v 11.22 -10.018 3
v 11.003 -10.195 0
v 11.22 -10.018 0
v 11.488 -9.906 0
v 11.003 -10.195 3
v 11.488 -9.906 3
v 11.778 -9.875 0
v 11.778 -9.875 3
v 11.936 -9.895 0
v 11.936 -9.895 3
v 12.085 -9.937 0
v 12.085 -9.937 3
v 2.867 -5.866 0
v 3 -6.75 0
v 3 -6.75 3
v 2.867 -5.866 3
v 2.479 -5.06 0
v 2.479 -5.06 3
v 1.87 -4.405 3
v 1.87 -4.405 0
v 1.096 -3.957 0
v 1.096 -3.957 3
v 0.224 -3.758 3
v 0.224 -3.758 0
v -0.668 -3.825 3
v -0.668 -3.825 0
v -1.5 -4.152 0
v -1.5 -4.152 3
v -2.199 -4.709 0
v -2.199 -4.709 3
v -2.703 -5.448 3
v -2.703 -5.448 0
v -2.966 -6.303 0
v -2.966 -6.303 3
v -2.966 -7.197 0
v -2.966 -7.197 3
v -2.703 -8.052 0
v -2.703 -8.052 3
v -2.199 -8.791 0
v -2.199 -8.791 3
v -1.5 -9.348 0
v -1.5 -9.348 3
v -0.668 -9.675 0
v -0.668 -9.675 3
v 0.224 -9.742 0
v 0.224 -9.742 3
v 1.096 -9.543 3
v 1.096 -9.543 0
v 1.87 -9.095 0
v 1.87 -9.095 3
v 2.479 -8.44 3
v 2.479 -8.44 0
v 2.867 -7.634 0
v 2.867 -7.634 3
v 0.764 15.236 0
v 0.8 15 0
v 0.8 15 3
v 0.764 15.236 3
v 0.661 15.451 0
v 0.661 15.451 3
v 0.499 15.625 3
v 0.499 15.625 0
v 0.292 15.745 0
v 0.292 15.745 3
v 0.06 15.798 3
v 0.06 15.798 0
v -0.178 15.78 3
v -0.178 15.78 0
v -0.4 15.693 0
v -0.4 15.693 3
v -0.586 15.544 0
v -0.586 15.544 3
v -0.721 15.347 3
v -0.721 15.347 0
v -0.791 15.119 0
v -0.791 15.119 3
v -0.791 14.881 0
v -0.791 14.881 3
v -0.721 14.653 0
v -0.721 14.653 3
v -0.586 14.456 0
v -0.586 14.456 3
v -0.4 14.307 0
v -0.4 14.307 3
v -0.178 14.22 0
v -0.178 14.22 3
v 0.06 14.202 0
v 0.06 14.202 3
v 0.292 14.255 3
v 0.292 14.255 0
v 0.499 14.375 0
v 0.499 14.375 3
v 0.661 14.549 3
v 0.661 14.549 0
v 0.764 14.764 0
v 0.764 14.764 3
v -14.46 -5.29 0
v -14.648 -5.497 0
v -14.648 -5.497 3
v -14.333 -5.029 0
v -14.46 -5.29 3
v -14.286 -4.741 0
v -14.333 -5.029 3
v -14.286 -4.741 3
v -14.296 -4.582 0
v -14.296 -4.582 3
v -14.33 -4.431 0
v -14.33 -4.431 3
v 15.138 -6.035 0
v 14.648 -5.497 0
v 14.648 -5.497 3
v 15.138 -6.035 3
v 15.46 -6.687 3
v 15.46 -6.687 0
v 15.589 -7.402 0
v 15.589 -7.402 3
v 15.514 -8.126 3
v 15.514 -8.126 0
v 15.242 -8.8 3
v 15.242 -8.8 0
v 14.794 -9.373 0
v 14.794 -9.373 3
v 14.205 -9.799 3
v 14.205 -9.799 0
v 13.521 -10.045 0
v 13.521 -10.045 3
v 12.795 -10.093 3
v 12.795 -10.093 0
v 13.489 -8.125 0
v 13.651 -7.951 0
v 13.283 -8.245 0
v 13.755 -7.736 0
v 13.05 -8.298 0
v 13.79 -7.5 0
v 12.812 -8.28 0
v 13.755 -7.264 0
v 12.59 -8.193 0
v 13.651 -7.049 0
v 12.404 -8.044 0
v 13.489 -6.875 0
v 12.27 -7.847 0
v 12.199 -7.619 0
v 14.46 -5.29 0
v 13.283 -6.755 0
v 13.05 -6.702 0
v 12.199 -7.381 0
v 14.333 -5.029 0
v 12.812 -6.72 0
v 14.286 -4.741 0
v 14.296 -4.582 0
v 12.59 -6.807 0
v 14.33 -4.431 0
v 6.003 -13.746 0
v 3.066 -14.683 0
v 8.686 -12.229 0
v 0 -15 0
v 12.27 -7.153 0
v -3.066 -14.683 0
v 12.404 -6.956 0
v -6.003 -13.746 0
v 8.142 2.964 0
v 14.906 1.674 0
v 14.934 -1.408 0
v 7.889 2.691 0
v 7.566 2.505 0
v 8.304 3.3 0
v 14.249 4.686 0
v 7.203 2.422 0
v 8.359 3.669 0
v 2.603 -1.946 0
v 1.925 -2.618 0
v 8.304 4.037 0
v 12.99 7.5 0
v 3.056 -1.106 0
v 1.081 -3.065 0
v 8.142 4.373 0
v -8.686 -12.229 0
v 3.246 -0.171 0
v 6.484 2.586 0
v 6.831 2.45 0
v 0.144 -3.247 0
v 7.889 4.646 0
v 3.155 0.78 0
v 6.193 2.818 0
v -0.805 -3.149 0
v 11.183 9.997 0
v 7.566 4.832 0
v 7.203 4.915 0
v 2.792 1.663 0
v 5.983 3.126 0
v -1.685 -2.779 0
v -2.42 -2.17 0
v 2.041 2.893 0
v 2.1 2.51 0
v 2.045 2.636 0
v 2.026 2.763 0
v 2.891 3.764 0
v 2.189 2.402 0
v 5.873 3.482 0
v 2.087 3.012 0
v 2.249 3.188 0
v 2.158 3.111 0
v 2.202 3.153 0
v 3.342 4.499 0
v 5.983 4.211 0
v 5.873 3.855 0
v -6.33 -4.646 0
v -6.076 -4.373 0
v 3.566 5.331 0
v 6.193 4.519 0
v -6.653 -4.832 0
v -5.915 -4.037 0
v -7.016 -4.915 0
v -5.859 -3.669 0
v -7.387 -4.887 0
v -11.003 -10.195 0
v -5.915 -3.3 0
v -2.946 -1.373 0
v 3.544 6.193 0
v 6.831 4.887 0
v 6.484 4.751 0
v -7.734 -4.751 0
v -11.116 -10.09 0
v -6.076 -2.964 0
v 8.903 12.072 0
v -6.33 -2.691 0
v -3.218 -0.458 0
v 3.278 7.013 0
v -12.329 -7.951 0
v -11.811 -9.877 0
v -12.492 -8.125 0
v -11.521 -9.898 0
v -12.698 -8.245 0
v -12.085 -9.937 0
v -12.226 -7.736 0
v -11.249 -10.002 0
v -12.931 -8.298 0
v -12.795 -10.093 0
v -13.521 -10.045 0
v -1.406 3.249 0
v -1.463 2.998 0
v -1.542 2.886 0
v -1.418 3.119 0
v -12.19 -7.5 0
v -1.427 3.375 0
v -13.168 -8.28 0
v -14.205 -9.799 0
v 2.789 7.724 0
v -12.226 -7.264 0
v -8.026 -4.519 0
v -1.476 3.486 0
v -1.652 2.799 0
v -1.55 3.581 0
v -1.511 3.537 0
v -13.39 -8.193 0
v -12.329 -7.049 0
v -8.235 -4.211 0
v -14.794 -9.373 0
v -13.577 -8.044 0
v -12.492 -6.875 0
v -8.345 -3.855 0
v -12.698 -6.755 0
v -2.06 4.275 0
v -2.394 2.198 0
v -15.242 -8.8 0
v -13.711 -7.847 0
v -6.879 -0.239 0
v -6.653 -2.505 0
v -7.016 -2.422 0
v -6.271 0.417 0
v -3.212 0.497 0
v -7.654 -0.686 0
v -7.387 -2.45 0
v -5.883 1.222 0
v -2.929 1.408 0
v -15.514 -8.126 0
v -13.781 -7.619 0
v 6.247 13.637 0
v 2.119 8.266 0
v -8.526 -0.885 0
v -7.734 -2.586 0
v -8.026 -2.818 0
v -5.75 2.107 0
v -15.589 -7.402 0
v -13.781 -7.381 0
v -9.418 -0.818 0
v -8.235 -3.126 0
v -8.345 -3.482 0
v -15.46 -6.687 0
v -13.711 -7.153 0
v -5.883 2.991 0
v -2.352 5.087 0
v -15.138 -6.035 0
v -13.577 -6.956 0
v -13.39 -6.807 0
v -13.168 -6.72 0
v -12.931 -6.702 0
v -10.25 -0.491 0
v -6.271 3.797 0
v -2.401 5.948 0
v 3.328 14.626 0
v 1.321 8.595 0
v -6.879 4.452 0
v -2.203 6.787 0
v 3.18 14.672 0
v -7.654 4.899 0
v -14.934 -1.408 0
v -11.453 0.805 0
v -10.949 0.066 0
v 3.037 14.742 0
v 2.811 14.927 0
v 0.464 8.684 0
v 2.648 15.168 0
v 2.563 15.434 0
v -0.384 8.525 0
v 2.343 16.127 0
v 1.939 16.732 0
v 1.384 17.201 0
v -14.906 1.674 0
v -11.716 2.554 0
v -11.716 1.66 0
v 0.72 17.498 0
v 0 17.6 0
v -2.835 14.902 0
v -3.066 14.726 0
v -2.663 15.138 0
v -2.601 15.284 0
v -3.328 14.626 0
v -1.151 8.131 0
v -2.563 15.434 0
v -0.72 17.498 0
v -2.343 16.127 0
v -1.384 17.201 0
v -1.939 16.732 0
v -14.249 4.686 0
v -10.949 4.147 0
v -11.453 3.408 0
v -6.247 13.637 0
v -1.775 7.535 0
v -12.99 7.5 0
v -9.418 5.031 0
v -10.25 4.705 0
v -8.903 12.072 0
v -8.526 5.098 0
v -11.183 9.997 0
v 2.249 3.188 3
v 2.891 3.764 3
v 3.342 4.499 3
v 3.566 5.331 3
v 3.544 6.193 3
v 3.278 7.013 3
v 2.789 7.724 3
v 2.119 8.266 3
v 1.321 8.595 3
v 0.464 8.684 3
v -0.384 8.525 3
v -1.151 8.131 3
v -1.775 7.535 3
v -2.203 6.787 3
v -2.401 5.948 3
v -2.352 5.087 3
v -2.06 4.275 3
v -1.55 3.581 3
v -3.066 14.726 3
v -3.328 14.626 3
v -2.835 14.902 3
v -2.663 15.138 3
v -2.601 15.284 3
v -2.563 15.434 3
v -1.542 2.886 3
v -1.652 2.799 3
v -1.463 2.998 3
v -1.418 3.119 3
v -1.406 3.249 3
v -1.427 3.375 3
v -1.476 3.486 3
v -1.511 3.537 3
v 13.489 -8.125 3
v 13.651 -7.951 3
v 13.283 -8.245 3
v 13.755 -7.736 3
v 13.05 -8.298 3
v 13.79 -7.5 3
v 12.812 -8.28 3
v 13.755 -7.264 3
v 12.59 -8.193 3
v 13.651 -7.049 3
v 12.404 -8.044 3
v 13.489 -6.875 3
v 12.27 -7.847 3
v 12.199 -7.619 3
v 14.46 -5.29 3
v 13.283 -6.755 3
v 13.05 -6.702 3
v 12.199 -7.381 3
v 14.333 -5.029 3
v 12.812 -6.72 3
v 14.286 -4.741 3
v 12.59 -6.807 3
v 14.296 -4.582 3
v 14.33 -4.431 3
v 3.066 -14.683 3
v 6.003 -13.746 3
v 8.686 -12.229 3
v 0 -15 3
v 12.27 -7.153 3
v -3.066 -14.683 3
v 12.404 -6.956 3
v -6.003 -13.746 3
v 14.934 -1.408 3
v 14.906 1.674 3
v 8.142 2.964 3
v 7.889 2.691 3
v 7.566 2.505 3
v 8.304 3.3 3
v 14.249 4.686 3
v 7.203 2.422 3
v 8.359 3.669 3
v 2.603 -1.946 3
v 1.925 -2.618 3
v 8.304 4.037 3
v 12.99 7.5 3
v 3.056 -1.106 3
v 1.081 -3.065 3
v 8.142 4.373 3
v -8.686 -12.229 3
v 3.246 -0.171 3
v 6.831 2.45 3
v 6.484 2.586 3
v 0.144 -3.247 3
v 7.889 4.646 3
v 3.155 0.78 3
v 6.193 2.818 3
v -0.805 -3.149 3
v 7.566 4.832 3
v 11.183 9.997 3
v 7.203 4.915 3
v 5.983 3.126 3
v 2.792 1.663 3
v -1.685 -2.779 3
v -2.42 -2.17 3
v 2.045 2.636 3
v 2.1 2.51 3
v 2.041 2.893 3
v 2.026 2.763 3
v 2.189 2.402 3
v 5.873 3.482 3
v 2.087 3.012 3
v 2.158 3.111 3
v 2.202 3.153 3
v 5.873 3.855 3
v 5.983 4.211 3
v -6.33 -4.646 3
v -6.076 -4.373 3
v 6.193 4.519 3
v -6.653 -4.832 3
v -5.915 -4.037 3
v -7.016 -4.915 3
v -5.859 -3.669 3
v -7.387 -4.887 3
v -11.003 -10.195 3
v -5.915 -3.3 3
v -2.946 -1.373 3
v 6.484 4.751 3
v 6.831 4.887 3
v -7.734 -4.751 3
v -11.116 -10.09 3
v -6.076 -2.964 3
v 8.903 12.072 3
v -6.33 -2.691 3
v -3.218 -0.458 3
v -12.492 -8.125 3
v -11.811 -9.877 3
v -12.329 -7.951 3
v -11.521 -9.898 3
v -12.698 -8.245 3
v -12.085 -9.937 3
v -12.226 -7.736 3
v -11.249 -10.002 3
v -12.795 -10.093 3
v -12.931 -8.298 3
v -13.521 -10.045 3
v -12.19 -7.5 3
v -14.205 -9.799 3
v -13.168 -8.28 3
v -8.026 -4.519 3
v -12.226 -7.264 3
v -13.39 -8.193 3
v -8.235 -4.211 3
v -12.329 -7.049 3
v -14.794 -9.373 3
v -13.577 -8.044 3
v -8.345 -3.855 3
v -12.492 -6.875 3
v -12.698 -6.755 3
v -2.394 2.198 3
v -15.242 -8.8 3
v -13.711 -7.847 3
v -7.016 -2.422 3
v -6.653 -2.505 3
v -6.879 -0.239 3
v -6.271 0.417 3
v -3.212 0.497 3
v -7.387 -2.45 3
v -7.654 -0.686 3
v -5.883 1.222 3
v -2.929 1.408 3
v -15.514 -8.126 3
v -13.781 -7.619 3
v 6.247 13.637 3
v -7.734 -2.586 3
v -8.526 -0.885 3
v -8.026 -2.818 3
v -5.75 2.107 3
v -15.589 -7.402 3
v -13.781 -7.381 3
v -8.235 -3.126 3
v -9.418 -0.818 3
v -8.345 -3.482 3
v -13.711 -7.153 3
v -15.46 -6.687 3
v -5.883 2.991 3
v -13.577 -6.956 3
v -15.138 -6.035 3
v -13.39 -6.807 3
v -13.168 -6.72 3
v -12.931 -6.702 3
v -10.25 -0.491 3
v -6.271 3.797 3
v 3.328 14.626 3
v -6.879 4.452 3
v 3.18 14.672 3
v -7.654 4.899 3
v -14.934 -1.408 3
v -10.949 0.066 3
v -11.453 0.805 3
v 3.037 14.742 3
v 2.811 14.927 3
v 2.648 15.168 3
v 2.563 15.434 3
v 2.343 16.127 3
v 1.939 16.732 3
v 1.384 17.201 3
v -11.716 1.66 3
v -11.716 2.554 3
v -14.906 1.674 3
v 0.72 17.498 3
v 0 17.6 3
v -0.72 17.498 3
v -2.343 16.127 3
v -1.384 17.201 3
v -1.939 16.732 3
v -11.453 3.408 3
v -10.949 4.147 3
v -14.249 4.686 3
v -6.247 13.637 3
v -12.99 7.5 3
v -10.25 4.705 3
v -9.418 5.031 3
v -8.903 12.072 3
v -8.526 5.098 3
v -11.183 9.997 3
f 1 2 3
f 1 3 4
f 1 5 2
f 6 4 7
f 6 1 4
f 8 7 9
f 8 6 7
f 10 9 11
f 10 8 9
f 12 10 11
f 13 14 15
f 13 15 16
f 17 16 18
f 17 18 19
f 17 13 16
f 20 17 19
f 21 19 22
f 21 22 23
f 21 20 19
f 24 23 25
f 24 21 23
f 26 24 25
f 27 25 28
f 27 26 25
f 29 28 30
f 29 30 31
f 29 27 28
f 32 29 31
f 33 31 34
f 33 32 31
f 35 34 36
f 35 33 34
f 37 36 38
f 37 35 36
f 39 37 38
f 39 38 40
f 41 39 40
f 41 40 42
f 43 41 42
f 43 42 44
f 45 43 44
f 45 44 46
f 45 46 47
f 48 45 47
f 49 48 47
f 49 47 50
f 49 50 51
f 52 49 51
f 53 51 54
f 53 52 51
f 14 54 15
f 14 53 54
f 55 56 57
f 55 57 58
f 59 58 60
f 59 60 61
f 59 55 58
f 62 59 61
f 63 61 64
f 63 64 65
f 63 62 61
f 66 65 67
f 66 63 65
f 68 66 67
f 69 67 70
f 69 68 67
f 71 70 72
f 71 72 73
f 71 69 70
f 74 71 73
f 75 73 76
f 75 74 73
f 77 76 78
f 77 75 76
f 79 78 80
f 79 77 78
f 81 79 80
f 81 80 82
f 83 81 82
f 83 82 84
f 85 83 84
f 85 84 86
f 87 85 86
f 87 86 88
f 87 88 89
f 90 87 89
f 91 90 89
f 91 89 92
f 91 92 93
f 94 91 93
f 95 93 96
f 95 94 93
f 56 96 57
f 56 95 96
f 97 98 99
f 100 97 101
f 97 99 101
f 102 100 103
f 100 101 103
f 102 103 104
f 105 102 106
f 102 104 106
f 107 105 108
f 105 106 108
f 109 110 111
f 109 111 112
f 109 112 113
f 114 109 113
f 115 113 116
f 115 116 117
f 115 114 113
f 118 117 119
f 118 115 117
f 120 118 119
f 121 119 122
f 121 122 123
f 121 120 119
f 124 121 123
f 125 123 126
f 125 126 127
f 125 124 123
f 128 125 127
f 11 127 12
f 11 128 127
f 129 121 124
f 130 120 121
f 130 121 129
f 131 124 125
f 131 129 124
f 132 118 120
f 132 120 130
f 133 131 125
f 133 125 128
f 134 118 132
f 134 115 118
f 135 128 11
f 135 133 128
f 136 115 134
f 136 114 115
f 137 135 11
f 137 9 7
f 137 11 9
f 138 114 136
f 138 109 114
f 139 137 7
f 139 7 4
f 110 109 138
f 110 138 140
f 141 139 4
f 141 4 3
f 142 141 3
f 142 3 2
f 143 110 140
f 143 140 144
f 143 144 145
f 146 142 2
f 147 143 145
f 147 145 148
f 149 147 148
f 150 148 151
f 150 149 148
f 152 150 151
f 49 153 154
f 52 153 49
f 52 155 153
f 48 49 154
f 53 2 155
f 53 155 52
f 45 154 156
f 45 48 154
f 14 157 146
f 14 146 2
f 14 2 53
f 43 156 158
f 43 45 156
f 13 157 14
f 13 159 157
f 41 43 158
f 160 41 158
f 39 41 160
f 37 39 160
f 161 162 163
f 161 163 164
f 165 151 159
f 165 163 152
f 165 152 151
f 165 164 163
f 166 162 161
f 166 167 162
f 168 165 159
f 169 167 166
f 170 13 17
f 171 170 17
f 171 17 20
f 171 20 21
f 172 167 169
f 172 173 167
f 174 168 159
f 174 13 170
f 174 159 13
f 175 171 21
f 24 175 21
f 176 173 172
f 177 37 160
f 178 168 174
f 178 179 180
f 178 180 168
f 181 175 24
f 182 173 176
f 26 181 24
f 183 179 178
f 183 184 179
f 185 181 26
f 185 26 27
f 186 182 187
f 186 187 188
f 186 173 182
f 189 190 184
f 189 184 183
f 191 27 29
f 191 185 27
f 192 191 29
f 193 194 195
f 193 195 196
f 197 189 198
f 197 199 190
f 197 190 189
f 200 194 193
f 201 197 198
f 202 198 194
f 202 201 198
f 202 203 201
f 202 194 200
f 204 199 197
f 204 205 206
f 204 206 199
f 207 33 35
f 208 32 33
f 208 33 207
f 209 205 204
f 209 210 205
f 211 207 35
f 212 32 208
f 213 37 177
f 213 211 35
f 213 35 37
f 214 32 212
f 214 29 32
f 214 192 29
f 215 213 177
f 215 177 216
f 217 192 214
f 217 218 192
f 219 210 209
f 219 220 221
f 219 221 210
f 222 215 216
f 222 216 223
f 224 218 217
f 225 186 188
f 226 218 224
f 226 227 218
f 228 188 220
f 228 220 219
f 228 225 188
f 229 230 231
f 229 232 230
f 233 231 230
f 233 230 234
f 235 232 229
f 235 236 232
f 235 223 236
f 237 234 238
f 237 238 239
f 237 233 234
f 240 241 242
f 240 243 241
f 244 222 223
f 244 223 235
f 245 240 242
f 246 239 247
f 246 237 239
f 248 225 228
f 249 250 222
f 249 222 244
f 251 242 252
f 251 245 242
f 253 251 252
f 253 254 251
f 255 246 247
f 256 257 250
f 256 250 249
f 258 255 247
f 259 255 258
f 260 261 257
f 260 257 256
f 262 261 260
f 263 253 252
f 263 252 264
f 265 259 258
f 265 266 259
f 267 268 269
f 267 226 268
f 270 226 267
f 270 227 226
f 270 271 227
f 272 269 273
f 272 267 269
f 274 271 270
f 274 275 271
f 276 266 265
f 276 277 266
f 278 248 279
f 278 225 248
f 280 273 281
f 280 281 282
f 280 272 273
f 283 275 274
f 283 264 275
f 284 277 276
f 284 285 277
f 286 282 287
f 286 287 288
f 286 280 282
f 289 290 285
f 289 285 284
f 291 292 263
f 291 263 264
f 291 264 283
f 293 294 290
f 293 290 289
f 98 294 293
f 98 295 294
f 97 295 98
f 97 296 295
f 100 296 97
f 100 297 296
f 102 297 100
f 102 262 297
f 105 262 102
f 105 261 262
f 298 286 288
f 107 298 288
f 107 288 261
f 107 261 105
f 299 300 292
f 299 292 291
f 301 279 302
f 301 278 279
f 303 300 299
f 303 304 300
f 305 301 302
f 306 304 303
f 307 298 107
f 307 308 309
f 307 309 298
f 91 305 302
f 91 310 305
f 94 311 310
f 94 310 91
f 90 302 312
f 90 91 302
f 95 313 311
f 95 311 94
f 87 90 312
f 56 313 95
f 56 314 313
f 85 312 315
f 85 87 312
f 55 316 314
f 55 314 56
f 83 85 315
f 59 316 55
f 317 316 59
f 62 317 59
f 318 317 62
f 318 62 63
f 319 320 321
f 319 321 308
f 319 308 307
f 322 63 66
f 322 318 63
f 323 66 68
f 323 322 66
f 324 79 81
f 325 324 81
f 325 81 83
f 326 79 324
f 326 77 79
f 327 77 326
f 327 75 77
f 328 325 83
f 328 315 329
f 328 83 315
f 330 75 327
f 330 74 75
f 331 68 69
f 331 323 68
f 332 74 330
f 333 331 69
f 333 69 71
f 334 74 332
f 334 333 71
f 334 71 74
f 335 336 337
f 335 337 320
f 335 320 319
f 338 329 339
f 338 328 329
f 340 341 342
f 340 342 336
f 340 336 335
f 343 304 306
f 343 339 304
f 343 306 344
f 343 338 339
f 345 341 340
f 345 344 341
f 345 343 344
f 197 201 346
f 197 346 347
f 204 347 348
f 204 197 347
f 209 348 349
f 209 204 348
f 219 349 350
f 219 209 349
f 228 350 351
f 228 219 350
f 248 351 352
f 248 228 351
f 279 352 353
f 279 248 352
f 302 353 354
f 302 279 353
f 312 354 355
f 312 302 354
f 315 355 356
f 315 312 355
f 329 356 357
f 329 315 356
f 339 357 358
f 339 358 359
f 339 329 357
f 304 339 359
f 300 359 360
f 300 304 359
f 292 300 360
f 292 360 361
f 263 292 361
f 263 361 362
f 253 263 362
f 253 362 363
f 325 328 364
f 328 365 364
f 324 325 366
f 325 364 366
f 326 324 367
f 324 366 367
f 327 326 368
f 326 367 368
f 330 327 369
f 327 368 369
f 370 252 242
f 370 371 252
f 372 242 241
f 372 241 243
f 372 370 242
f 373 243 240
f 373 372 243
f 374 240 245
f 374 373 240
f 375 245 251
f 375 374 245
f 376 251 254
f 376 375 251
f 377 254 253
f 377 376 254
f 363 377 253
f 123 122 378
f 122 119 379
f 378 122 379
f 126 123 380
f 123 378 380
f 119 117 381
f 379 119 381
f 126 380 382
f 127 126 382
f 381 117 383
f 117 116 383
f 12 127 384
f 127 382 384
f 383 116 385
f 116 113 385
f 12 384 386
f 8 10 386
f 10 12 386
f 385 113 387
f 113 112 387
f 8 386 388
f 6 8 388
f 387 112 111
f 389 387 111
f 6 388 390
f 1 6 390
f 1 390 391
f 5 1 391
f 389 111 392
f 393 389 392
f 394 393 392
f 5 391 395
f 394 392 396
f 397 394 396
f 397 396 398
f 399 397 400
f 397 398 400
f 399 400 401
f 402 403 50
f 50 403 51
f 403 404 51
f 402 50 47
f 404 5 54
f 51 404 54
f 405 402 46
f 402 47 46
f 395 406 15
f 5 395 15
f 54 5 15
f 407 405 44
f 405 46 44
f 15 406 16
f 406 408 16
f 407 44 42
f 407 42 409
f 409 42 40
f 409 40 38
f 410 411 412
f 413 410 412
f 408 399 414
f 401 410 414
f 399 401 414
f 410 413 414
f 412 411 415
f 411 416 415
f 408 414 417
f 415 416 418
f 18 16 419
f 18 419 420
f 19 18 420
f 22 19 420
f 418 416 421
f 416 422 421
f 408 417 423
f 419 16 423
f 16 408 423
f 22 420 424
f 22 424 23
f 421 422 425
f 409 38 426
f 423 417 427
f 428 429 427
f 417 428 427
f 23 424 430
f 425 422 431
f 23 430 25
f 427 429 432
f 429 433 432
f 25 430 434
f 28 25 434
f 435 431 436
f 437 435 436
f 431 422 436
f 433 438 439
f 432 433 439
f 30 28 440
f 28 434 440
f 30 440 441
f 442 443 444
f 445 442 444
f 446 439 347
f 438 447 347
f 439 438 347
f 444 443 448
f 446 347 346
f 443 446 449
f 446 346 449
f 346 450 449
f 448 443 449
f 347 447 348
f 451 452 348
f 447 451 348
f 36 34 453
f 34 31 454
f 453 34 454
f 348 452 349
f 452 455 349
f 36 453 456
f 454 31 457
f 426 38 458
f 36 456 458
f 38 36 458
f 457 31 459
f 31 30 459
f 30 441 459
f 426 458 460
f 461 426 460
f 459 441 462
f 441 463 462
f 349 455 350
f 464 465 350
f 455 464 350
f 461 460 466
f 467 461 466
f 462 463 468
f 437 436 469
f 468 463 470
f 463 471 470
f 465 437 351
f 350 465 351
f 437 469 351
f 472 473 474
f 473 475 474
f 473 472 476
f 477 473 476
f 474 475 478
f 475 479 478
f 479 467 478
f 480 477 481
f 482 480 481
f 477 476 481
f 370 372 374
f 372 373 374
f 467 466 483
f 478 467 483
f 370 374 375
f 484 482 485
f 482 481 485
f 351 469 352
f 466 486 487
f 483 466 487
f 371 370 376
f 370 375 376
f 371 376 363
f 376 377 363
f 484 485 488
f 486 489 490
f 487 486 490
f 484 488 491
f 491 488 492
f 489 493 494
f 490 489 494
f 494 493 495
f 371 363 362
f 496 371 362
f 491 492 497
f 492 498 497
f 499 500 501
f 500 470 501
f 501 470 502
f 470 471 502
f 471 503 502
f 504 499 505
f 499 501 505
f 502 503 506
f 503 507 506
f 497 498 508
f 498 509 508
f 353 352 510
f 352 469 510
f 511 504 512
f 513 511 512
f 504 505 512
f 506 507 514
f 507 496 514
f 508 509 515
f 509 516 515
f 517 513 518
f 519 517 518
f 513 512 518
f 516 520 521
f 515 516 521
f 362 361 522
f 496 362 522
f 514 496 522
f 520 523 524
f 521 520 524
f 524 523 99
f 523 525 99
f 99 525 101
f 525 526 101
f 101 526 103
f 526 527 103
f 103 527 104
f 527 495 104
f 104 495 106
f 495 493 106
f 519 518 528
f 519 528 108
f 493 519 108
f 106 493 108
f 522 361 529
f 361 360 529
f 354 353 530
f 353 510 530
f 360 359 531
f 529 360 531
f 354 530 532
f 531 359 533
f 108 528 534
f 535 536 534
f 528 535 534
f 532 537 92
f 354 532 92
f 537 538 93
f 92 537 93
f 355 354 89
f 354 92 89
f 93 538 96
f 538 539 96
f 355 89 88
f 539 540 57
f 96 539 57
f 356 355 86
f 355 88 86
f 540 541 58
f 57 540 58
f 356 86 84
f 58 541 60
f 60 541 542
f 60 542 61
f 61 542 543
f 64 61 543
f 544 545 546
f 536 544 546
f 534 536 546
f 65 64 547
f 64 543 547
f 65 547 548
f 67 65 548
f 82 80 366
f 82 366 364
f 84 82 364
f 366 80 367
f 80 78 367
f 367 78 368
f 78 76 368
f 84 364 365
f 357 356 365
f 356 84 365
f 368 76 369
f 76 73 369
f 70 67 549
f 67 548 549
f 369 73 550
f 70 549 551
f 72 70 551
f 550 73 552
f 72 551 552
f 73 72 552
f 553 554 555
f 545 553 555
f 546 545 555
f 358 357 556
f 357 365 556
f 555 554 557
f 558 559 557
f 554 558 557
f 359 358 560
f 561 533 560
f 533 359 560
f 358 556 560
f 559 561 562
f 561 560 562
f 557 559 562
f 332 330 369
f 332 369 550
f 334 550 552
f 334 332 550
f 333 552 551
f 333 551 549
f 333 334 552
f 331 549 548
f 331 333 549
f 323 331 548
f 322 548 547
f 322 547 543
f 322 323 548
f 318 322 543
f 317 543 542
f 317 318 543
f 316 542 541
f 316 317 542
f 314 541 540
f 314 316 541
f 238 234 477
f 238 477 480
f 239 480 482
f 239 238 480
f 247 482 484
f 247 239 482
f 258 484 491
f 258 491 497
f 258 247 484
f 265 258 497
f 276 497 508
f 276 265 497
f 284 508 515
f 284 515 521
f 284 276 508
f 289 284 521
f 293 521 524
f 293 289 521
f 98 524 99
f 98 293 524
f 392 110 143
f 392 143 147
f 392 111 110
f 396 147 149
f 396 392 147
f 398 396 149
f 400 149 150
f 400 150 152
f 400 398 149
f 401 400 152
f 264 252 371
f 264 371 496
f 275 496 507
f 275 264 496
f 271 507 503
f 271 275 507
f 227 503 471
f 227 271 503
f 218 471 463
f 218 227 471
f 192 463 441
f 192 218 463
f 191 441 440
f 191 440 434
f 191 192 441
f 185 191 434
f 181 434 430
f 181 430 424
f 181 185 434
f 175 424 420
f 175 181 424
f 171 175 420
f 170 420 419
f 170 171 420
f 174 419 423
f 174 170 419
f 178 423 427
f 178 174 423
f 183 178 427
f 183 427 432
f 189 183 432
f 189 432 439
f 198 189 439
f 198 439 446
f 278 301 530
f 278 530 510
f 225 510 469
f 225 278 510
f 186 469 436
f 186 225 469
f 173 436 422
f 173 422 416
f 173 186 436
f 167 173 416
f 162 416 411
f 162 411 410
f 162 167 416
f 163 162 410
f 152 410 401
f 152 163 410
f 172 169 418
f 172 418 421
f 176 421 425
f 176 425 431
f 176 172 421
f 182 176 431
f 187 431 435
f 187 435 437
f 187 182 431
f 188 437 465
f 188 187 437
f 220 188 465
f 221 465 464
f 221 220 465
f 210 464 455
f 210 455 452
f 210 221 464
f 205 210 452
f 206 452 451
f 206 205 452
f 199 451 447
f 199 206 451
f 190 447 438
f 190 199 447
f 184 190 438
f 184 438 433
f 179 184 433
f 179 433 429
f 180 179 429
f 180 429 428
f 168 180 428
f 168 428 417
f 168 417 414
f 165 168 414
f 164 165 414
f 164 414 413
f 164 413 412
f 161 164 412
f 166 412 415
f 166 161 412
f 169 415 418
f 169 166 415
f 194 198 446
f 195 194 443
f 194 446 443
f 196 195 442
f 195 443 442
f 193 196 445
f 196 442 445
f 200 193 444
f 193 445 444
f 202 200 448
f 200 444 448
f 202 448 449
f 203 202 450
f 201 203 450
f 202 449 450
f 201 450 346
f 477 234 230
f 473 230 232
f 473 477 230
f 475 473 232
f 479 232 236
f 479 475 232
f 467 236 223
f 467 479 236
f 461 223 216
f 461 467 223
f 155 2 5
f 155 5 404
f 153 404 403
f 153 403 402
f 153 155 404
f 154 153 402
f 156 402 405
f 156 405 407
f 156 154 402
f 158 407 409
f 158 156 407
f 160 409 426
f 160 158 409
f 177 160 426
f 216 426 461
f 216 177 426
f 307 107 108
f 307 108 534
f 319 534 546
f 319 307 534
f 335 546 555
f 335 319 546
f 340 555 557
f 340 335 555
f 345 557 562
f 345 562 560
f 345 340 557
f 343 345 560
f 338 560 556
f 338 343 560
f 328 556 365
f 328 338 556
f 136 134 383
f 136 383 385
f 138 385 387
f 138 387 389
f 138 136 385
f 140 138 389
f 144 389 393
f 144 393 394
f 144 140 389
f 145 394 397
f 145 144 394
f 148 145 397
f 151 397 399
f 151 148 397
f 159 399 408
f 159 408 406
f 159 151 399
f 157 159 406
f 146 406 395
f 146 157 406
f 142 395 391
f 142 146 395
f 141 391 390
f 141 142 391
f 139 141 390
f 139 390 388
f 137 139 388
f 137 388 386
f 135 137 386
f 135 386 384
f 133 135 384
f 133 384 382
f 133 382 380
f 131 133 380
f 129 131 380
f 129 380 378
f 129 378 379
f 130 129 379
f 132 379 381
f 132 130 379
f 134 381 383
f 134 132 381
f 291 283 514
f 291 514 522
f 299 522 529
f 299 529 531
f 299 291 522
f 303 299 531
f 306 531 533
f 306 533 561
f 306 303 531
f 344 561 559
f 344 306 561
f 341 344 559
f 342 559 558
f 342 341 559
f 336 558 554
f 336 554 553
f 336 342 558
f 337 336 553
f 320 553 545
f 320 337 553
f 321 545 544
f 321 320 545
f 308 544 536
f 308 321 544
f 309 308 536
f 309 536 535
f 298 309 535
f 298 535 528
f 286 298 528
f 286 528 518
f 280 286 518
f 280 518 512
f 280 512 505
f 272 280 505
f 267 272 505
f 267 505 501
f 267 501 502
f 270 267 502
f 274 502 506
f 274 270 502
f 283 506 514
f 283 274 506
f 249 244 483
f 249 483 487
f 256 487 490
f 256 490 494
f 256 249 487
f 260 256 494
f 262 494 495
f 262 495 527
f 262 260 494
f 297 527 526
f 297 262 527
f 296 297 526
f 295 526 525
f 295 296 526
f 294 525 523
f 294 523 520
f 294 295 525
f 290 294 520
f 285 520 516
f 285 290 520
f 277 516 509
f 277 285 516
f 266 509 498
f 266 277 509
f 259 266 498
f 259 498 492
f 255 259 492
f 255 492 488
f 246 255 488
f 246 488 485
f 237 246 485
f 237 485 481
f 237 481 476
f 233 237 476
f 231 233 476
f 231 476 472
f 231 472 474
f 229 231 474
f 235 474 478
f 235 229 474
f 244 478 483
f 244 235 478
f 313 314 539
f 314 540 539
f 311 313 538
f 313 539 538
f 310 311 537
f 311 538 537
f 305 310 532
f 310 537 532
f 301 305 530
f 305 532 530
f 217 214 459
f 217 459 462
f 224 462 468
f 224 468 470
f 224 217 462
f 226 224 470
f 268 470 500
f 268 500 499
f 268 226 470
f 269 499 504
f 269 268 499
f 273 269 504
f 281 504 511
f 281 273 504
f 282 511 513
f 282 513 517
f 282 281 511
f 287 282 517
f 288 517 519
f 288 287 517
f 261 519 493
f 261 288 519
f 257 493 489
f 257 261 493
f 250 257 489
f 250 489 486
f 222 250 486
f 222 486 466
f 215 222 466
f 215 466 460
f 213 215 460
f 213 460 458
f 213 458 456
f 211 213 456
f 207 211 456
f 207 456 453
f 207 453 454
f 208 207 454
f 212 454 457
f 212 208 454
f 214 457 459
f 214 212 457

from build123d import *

# Parameters (mm, degrees)
SKETCH_1_R      = 3
SKETCH_1_R_2    = 0.8
SKETCH_1_R_3    = 1.25
EXTRUDE_1_DEPTH = 3
FILLET_1_R      = 0.5
FILLET_2_R      = 1


with BuildPart() as part:
    # ｽｹｯﾁ1 → ﾎﾞｽ - 押し出し1 (new body)
    with BuildSketch(Plane.XY):
        with BuildLine():
            ThreePointArc((-11.50012809, -9.630527187), (-15.242047107, -8.8), (-14.090345241, -5.144139479))
            ThreePointArc((-14.090345241, -5.144139479), (-12.990381057, 7.5), (-2.590217151, 14.774666667))
            ThreePointArc((-2.590217151, 14.774666667), (0, 17.6), (2.590217151, 14.774666667))
            ThreePointArc((2.590217151, 14.774666667), (12.990381057, 7.5), (14.090345241, -5.144139479))
            ThreePointArc((14.090345241, -5.144139479), (15.242047107, -8.8), (11.50012809, -9.630527187))
            ThreePointArc((11.50012809, -9.630527187), (0, -15), (-11.50012809, -9.630527187))
        make_face()
        with Locations((-8.749968889, 2.106666667)):
            Circle(SKETCH_1_R, mode=Mode.SUBTRACT)
        with Locations((0, -6.75)):
            Circle(SKETCH_1_R, mode=Mode.SUBTRACT)
        with Locations((0, 15)):
            Circle(SKETCH_1_R_2, mode=Mode.SUBTRACT)
        with Locations((12.990381057, -7.5)):
            Circle(SKETCH_1_R_2, mode=Mode.SUBTRACT)
        with Locations((-12.990381057, -7.5)):
            Circle(SKETCH_1_R_2, mode=Mode.SUBTRACT)
        with Locations((-7.109225892, -3.668638333)):
            Circle(SKETCH_1_R_3, mode=Mode.SUBTRACT)
        with Locations((7.109225892, 3.668638333)):
            Circle(SKETCH_1_R_3, mode=Mode.SUBTRACT)
        with BuildLine():
            ThreePointArc((1.563335837, 2.849294836), (0.895749756, 8.670249526), (-0.94779451, 3.108727323))
            ThreePointArc((-0.94779451, 3.108727323), (-0.333989648, -3.232793052), (1.563335837, 2.849294836))
        make_face(mode=Mode.SUBTRACT)
    extrude(amount=EXTRUDE_1_DEPTH)

    # ﾌｨﾚｯﾄ1
    fillet_1_edges = [part.edges().sort_by_distance(p)[0] for p in [
        (-0.94779451, 3.108727323, 1.5),
        (1.563335837, 2.849294836, 1.5),
    ]]
    fillet(fillet_1_edges, radius=FILLET_1_R)

    # ﾌｨﾚｯﾄ2
    fillet_2_edges = [part.edges().sort_by_distance(p)[0] for p in [
        (-11.50012809, -9.630527187, 1.5),
        (-14.090345241, -5.144139479, 1.5),
        (-2.590217151, 14.774666667, 1.5),
        (2.590217151, 14.774666667, 1.5),
        (14.090345241, -5.144139479, 1.5),
        (11.50012809, -9.630527187, 1.5),
    ]]
    fillet(fillet_2_edges, radius=FILLET_2_R)


solid = part.part
